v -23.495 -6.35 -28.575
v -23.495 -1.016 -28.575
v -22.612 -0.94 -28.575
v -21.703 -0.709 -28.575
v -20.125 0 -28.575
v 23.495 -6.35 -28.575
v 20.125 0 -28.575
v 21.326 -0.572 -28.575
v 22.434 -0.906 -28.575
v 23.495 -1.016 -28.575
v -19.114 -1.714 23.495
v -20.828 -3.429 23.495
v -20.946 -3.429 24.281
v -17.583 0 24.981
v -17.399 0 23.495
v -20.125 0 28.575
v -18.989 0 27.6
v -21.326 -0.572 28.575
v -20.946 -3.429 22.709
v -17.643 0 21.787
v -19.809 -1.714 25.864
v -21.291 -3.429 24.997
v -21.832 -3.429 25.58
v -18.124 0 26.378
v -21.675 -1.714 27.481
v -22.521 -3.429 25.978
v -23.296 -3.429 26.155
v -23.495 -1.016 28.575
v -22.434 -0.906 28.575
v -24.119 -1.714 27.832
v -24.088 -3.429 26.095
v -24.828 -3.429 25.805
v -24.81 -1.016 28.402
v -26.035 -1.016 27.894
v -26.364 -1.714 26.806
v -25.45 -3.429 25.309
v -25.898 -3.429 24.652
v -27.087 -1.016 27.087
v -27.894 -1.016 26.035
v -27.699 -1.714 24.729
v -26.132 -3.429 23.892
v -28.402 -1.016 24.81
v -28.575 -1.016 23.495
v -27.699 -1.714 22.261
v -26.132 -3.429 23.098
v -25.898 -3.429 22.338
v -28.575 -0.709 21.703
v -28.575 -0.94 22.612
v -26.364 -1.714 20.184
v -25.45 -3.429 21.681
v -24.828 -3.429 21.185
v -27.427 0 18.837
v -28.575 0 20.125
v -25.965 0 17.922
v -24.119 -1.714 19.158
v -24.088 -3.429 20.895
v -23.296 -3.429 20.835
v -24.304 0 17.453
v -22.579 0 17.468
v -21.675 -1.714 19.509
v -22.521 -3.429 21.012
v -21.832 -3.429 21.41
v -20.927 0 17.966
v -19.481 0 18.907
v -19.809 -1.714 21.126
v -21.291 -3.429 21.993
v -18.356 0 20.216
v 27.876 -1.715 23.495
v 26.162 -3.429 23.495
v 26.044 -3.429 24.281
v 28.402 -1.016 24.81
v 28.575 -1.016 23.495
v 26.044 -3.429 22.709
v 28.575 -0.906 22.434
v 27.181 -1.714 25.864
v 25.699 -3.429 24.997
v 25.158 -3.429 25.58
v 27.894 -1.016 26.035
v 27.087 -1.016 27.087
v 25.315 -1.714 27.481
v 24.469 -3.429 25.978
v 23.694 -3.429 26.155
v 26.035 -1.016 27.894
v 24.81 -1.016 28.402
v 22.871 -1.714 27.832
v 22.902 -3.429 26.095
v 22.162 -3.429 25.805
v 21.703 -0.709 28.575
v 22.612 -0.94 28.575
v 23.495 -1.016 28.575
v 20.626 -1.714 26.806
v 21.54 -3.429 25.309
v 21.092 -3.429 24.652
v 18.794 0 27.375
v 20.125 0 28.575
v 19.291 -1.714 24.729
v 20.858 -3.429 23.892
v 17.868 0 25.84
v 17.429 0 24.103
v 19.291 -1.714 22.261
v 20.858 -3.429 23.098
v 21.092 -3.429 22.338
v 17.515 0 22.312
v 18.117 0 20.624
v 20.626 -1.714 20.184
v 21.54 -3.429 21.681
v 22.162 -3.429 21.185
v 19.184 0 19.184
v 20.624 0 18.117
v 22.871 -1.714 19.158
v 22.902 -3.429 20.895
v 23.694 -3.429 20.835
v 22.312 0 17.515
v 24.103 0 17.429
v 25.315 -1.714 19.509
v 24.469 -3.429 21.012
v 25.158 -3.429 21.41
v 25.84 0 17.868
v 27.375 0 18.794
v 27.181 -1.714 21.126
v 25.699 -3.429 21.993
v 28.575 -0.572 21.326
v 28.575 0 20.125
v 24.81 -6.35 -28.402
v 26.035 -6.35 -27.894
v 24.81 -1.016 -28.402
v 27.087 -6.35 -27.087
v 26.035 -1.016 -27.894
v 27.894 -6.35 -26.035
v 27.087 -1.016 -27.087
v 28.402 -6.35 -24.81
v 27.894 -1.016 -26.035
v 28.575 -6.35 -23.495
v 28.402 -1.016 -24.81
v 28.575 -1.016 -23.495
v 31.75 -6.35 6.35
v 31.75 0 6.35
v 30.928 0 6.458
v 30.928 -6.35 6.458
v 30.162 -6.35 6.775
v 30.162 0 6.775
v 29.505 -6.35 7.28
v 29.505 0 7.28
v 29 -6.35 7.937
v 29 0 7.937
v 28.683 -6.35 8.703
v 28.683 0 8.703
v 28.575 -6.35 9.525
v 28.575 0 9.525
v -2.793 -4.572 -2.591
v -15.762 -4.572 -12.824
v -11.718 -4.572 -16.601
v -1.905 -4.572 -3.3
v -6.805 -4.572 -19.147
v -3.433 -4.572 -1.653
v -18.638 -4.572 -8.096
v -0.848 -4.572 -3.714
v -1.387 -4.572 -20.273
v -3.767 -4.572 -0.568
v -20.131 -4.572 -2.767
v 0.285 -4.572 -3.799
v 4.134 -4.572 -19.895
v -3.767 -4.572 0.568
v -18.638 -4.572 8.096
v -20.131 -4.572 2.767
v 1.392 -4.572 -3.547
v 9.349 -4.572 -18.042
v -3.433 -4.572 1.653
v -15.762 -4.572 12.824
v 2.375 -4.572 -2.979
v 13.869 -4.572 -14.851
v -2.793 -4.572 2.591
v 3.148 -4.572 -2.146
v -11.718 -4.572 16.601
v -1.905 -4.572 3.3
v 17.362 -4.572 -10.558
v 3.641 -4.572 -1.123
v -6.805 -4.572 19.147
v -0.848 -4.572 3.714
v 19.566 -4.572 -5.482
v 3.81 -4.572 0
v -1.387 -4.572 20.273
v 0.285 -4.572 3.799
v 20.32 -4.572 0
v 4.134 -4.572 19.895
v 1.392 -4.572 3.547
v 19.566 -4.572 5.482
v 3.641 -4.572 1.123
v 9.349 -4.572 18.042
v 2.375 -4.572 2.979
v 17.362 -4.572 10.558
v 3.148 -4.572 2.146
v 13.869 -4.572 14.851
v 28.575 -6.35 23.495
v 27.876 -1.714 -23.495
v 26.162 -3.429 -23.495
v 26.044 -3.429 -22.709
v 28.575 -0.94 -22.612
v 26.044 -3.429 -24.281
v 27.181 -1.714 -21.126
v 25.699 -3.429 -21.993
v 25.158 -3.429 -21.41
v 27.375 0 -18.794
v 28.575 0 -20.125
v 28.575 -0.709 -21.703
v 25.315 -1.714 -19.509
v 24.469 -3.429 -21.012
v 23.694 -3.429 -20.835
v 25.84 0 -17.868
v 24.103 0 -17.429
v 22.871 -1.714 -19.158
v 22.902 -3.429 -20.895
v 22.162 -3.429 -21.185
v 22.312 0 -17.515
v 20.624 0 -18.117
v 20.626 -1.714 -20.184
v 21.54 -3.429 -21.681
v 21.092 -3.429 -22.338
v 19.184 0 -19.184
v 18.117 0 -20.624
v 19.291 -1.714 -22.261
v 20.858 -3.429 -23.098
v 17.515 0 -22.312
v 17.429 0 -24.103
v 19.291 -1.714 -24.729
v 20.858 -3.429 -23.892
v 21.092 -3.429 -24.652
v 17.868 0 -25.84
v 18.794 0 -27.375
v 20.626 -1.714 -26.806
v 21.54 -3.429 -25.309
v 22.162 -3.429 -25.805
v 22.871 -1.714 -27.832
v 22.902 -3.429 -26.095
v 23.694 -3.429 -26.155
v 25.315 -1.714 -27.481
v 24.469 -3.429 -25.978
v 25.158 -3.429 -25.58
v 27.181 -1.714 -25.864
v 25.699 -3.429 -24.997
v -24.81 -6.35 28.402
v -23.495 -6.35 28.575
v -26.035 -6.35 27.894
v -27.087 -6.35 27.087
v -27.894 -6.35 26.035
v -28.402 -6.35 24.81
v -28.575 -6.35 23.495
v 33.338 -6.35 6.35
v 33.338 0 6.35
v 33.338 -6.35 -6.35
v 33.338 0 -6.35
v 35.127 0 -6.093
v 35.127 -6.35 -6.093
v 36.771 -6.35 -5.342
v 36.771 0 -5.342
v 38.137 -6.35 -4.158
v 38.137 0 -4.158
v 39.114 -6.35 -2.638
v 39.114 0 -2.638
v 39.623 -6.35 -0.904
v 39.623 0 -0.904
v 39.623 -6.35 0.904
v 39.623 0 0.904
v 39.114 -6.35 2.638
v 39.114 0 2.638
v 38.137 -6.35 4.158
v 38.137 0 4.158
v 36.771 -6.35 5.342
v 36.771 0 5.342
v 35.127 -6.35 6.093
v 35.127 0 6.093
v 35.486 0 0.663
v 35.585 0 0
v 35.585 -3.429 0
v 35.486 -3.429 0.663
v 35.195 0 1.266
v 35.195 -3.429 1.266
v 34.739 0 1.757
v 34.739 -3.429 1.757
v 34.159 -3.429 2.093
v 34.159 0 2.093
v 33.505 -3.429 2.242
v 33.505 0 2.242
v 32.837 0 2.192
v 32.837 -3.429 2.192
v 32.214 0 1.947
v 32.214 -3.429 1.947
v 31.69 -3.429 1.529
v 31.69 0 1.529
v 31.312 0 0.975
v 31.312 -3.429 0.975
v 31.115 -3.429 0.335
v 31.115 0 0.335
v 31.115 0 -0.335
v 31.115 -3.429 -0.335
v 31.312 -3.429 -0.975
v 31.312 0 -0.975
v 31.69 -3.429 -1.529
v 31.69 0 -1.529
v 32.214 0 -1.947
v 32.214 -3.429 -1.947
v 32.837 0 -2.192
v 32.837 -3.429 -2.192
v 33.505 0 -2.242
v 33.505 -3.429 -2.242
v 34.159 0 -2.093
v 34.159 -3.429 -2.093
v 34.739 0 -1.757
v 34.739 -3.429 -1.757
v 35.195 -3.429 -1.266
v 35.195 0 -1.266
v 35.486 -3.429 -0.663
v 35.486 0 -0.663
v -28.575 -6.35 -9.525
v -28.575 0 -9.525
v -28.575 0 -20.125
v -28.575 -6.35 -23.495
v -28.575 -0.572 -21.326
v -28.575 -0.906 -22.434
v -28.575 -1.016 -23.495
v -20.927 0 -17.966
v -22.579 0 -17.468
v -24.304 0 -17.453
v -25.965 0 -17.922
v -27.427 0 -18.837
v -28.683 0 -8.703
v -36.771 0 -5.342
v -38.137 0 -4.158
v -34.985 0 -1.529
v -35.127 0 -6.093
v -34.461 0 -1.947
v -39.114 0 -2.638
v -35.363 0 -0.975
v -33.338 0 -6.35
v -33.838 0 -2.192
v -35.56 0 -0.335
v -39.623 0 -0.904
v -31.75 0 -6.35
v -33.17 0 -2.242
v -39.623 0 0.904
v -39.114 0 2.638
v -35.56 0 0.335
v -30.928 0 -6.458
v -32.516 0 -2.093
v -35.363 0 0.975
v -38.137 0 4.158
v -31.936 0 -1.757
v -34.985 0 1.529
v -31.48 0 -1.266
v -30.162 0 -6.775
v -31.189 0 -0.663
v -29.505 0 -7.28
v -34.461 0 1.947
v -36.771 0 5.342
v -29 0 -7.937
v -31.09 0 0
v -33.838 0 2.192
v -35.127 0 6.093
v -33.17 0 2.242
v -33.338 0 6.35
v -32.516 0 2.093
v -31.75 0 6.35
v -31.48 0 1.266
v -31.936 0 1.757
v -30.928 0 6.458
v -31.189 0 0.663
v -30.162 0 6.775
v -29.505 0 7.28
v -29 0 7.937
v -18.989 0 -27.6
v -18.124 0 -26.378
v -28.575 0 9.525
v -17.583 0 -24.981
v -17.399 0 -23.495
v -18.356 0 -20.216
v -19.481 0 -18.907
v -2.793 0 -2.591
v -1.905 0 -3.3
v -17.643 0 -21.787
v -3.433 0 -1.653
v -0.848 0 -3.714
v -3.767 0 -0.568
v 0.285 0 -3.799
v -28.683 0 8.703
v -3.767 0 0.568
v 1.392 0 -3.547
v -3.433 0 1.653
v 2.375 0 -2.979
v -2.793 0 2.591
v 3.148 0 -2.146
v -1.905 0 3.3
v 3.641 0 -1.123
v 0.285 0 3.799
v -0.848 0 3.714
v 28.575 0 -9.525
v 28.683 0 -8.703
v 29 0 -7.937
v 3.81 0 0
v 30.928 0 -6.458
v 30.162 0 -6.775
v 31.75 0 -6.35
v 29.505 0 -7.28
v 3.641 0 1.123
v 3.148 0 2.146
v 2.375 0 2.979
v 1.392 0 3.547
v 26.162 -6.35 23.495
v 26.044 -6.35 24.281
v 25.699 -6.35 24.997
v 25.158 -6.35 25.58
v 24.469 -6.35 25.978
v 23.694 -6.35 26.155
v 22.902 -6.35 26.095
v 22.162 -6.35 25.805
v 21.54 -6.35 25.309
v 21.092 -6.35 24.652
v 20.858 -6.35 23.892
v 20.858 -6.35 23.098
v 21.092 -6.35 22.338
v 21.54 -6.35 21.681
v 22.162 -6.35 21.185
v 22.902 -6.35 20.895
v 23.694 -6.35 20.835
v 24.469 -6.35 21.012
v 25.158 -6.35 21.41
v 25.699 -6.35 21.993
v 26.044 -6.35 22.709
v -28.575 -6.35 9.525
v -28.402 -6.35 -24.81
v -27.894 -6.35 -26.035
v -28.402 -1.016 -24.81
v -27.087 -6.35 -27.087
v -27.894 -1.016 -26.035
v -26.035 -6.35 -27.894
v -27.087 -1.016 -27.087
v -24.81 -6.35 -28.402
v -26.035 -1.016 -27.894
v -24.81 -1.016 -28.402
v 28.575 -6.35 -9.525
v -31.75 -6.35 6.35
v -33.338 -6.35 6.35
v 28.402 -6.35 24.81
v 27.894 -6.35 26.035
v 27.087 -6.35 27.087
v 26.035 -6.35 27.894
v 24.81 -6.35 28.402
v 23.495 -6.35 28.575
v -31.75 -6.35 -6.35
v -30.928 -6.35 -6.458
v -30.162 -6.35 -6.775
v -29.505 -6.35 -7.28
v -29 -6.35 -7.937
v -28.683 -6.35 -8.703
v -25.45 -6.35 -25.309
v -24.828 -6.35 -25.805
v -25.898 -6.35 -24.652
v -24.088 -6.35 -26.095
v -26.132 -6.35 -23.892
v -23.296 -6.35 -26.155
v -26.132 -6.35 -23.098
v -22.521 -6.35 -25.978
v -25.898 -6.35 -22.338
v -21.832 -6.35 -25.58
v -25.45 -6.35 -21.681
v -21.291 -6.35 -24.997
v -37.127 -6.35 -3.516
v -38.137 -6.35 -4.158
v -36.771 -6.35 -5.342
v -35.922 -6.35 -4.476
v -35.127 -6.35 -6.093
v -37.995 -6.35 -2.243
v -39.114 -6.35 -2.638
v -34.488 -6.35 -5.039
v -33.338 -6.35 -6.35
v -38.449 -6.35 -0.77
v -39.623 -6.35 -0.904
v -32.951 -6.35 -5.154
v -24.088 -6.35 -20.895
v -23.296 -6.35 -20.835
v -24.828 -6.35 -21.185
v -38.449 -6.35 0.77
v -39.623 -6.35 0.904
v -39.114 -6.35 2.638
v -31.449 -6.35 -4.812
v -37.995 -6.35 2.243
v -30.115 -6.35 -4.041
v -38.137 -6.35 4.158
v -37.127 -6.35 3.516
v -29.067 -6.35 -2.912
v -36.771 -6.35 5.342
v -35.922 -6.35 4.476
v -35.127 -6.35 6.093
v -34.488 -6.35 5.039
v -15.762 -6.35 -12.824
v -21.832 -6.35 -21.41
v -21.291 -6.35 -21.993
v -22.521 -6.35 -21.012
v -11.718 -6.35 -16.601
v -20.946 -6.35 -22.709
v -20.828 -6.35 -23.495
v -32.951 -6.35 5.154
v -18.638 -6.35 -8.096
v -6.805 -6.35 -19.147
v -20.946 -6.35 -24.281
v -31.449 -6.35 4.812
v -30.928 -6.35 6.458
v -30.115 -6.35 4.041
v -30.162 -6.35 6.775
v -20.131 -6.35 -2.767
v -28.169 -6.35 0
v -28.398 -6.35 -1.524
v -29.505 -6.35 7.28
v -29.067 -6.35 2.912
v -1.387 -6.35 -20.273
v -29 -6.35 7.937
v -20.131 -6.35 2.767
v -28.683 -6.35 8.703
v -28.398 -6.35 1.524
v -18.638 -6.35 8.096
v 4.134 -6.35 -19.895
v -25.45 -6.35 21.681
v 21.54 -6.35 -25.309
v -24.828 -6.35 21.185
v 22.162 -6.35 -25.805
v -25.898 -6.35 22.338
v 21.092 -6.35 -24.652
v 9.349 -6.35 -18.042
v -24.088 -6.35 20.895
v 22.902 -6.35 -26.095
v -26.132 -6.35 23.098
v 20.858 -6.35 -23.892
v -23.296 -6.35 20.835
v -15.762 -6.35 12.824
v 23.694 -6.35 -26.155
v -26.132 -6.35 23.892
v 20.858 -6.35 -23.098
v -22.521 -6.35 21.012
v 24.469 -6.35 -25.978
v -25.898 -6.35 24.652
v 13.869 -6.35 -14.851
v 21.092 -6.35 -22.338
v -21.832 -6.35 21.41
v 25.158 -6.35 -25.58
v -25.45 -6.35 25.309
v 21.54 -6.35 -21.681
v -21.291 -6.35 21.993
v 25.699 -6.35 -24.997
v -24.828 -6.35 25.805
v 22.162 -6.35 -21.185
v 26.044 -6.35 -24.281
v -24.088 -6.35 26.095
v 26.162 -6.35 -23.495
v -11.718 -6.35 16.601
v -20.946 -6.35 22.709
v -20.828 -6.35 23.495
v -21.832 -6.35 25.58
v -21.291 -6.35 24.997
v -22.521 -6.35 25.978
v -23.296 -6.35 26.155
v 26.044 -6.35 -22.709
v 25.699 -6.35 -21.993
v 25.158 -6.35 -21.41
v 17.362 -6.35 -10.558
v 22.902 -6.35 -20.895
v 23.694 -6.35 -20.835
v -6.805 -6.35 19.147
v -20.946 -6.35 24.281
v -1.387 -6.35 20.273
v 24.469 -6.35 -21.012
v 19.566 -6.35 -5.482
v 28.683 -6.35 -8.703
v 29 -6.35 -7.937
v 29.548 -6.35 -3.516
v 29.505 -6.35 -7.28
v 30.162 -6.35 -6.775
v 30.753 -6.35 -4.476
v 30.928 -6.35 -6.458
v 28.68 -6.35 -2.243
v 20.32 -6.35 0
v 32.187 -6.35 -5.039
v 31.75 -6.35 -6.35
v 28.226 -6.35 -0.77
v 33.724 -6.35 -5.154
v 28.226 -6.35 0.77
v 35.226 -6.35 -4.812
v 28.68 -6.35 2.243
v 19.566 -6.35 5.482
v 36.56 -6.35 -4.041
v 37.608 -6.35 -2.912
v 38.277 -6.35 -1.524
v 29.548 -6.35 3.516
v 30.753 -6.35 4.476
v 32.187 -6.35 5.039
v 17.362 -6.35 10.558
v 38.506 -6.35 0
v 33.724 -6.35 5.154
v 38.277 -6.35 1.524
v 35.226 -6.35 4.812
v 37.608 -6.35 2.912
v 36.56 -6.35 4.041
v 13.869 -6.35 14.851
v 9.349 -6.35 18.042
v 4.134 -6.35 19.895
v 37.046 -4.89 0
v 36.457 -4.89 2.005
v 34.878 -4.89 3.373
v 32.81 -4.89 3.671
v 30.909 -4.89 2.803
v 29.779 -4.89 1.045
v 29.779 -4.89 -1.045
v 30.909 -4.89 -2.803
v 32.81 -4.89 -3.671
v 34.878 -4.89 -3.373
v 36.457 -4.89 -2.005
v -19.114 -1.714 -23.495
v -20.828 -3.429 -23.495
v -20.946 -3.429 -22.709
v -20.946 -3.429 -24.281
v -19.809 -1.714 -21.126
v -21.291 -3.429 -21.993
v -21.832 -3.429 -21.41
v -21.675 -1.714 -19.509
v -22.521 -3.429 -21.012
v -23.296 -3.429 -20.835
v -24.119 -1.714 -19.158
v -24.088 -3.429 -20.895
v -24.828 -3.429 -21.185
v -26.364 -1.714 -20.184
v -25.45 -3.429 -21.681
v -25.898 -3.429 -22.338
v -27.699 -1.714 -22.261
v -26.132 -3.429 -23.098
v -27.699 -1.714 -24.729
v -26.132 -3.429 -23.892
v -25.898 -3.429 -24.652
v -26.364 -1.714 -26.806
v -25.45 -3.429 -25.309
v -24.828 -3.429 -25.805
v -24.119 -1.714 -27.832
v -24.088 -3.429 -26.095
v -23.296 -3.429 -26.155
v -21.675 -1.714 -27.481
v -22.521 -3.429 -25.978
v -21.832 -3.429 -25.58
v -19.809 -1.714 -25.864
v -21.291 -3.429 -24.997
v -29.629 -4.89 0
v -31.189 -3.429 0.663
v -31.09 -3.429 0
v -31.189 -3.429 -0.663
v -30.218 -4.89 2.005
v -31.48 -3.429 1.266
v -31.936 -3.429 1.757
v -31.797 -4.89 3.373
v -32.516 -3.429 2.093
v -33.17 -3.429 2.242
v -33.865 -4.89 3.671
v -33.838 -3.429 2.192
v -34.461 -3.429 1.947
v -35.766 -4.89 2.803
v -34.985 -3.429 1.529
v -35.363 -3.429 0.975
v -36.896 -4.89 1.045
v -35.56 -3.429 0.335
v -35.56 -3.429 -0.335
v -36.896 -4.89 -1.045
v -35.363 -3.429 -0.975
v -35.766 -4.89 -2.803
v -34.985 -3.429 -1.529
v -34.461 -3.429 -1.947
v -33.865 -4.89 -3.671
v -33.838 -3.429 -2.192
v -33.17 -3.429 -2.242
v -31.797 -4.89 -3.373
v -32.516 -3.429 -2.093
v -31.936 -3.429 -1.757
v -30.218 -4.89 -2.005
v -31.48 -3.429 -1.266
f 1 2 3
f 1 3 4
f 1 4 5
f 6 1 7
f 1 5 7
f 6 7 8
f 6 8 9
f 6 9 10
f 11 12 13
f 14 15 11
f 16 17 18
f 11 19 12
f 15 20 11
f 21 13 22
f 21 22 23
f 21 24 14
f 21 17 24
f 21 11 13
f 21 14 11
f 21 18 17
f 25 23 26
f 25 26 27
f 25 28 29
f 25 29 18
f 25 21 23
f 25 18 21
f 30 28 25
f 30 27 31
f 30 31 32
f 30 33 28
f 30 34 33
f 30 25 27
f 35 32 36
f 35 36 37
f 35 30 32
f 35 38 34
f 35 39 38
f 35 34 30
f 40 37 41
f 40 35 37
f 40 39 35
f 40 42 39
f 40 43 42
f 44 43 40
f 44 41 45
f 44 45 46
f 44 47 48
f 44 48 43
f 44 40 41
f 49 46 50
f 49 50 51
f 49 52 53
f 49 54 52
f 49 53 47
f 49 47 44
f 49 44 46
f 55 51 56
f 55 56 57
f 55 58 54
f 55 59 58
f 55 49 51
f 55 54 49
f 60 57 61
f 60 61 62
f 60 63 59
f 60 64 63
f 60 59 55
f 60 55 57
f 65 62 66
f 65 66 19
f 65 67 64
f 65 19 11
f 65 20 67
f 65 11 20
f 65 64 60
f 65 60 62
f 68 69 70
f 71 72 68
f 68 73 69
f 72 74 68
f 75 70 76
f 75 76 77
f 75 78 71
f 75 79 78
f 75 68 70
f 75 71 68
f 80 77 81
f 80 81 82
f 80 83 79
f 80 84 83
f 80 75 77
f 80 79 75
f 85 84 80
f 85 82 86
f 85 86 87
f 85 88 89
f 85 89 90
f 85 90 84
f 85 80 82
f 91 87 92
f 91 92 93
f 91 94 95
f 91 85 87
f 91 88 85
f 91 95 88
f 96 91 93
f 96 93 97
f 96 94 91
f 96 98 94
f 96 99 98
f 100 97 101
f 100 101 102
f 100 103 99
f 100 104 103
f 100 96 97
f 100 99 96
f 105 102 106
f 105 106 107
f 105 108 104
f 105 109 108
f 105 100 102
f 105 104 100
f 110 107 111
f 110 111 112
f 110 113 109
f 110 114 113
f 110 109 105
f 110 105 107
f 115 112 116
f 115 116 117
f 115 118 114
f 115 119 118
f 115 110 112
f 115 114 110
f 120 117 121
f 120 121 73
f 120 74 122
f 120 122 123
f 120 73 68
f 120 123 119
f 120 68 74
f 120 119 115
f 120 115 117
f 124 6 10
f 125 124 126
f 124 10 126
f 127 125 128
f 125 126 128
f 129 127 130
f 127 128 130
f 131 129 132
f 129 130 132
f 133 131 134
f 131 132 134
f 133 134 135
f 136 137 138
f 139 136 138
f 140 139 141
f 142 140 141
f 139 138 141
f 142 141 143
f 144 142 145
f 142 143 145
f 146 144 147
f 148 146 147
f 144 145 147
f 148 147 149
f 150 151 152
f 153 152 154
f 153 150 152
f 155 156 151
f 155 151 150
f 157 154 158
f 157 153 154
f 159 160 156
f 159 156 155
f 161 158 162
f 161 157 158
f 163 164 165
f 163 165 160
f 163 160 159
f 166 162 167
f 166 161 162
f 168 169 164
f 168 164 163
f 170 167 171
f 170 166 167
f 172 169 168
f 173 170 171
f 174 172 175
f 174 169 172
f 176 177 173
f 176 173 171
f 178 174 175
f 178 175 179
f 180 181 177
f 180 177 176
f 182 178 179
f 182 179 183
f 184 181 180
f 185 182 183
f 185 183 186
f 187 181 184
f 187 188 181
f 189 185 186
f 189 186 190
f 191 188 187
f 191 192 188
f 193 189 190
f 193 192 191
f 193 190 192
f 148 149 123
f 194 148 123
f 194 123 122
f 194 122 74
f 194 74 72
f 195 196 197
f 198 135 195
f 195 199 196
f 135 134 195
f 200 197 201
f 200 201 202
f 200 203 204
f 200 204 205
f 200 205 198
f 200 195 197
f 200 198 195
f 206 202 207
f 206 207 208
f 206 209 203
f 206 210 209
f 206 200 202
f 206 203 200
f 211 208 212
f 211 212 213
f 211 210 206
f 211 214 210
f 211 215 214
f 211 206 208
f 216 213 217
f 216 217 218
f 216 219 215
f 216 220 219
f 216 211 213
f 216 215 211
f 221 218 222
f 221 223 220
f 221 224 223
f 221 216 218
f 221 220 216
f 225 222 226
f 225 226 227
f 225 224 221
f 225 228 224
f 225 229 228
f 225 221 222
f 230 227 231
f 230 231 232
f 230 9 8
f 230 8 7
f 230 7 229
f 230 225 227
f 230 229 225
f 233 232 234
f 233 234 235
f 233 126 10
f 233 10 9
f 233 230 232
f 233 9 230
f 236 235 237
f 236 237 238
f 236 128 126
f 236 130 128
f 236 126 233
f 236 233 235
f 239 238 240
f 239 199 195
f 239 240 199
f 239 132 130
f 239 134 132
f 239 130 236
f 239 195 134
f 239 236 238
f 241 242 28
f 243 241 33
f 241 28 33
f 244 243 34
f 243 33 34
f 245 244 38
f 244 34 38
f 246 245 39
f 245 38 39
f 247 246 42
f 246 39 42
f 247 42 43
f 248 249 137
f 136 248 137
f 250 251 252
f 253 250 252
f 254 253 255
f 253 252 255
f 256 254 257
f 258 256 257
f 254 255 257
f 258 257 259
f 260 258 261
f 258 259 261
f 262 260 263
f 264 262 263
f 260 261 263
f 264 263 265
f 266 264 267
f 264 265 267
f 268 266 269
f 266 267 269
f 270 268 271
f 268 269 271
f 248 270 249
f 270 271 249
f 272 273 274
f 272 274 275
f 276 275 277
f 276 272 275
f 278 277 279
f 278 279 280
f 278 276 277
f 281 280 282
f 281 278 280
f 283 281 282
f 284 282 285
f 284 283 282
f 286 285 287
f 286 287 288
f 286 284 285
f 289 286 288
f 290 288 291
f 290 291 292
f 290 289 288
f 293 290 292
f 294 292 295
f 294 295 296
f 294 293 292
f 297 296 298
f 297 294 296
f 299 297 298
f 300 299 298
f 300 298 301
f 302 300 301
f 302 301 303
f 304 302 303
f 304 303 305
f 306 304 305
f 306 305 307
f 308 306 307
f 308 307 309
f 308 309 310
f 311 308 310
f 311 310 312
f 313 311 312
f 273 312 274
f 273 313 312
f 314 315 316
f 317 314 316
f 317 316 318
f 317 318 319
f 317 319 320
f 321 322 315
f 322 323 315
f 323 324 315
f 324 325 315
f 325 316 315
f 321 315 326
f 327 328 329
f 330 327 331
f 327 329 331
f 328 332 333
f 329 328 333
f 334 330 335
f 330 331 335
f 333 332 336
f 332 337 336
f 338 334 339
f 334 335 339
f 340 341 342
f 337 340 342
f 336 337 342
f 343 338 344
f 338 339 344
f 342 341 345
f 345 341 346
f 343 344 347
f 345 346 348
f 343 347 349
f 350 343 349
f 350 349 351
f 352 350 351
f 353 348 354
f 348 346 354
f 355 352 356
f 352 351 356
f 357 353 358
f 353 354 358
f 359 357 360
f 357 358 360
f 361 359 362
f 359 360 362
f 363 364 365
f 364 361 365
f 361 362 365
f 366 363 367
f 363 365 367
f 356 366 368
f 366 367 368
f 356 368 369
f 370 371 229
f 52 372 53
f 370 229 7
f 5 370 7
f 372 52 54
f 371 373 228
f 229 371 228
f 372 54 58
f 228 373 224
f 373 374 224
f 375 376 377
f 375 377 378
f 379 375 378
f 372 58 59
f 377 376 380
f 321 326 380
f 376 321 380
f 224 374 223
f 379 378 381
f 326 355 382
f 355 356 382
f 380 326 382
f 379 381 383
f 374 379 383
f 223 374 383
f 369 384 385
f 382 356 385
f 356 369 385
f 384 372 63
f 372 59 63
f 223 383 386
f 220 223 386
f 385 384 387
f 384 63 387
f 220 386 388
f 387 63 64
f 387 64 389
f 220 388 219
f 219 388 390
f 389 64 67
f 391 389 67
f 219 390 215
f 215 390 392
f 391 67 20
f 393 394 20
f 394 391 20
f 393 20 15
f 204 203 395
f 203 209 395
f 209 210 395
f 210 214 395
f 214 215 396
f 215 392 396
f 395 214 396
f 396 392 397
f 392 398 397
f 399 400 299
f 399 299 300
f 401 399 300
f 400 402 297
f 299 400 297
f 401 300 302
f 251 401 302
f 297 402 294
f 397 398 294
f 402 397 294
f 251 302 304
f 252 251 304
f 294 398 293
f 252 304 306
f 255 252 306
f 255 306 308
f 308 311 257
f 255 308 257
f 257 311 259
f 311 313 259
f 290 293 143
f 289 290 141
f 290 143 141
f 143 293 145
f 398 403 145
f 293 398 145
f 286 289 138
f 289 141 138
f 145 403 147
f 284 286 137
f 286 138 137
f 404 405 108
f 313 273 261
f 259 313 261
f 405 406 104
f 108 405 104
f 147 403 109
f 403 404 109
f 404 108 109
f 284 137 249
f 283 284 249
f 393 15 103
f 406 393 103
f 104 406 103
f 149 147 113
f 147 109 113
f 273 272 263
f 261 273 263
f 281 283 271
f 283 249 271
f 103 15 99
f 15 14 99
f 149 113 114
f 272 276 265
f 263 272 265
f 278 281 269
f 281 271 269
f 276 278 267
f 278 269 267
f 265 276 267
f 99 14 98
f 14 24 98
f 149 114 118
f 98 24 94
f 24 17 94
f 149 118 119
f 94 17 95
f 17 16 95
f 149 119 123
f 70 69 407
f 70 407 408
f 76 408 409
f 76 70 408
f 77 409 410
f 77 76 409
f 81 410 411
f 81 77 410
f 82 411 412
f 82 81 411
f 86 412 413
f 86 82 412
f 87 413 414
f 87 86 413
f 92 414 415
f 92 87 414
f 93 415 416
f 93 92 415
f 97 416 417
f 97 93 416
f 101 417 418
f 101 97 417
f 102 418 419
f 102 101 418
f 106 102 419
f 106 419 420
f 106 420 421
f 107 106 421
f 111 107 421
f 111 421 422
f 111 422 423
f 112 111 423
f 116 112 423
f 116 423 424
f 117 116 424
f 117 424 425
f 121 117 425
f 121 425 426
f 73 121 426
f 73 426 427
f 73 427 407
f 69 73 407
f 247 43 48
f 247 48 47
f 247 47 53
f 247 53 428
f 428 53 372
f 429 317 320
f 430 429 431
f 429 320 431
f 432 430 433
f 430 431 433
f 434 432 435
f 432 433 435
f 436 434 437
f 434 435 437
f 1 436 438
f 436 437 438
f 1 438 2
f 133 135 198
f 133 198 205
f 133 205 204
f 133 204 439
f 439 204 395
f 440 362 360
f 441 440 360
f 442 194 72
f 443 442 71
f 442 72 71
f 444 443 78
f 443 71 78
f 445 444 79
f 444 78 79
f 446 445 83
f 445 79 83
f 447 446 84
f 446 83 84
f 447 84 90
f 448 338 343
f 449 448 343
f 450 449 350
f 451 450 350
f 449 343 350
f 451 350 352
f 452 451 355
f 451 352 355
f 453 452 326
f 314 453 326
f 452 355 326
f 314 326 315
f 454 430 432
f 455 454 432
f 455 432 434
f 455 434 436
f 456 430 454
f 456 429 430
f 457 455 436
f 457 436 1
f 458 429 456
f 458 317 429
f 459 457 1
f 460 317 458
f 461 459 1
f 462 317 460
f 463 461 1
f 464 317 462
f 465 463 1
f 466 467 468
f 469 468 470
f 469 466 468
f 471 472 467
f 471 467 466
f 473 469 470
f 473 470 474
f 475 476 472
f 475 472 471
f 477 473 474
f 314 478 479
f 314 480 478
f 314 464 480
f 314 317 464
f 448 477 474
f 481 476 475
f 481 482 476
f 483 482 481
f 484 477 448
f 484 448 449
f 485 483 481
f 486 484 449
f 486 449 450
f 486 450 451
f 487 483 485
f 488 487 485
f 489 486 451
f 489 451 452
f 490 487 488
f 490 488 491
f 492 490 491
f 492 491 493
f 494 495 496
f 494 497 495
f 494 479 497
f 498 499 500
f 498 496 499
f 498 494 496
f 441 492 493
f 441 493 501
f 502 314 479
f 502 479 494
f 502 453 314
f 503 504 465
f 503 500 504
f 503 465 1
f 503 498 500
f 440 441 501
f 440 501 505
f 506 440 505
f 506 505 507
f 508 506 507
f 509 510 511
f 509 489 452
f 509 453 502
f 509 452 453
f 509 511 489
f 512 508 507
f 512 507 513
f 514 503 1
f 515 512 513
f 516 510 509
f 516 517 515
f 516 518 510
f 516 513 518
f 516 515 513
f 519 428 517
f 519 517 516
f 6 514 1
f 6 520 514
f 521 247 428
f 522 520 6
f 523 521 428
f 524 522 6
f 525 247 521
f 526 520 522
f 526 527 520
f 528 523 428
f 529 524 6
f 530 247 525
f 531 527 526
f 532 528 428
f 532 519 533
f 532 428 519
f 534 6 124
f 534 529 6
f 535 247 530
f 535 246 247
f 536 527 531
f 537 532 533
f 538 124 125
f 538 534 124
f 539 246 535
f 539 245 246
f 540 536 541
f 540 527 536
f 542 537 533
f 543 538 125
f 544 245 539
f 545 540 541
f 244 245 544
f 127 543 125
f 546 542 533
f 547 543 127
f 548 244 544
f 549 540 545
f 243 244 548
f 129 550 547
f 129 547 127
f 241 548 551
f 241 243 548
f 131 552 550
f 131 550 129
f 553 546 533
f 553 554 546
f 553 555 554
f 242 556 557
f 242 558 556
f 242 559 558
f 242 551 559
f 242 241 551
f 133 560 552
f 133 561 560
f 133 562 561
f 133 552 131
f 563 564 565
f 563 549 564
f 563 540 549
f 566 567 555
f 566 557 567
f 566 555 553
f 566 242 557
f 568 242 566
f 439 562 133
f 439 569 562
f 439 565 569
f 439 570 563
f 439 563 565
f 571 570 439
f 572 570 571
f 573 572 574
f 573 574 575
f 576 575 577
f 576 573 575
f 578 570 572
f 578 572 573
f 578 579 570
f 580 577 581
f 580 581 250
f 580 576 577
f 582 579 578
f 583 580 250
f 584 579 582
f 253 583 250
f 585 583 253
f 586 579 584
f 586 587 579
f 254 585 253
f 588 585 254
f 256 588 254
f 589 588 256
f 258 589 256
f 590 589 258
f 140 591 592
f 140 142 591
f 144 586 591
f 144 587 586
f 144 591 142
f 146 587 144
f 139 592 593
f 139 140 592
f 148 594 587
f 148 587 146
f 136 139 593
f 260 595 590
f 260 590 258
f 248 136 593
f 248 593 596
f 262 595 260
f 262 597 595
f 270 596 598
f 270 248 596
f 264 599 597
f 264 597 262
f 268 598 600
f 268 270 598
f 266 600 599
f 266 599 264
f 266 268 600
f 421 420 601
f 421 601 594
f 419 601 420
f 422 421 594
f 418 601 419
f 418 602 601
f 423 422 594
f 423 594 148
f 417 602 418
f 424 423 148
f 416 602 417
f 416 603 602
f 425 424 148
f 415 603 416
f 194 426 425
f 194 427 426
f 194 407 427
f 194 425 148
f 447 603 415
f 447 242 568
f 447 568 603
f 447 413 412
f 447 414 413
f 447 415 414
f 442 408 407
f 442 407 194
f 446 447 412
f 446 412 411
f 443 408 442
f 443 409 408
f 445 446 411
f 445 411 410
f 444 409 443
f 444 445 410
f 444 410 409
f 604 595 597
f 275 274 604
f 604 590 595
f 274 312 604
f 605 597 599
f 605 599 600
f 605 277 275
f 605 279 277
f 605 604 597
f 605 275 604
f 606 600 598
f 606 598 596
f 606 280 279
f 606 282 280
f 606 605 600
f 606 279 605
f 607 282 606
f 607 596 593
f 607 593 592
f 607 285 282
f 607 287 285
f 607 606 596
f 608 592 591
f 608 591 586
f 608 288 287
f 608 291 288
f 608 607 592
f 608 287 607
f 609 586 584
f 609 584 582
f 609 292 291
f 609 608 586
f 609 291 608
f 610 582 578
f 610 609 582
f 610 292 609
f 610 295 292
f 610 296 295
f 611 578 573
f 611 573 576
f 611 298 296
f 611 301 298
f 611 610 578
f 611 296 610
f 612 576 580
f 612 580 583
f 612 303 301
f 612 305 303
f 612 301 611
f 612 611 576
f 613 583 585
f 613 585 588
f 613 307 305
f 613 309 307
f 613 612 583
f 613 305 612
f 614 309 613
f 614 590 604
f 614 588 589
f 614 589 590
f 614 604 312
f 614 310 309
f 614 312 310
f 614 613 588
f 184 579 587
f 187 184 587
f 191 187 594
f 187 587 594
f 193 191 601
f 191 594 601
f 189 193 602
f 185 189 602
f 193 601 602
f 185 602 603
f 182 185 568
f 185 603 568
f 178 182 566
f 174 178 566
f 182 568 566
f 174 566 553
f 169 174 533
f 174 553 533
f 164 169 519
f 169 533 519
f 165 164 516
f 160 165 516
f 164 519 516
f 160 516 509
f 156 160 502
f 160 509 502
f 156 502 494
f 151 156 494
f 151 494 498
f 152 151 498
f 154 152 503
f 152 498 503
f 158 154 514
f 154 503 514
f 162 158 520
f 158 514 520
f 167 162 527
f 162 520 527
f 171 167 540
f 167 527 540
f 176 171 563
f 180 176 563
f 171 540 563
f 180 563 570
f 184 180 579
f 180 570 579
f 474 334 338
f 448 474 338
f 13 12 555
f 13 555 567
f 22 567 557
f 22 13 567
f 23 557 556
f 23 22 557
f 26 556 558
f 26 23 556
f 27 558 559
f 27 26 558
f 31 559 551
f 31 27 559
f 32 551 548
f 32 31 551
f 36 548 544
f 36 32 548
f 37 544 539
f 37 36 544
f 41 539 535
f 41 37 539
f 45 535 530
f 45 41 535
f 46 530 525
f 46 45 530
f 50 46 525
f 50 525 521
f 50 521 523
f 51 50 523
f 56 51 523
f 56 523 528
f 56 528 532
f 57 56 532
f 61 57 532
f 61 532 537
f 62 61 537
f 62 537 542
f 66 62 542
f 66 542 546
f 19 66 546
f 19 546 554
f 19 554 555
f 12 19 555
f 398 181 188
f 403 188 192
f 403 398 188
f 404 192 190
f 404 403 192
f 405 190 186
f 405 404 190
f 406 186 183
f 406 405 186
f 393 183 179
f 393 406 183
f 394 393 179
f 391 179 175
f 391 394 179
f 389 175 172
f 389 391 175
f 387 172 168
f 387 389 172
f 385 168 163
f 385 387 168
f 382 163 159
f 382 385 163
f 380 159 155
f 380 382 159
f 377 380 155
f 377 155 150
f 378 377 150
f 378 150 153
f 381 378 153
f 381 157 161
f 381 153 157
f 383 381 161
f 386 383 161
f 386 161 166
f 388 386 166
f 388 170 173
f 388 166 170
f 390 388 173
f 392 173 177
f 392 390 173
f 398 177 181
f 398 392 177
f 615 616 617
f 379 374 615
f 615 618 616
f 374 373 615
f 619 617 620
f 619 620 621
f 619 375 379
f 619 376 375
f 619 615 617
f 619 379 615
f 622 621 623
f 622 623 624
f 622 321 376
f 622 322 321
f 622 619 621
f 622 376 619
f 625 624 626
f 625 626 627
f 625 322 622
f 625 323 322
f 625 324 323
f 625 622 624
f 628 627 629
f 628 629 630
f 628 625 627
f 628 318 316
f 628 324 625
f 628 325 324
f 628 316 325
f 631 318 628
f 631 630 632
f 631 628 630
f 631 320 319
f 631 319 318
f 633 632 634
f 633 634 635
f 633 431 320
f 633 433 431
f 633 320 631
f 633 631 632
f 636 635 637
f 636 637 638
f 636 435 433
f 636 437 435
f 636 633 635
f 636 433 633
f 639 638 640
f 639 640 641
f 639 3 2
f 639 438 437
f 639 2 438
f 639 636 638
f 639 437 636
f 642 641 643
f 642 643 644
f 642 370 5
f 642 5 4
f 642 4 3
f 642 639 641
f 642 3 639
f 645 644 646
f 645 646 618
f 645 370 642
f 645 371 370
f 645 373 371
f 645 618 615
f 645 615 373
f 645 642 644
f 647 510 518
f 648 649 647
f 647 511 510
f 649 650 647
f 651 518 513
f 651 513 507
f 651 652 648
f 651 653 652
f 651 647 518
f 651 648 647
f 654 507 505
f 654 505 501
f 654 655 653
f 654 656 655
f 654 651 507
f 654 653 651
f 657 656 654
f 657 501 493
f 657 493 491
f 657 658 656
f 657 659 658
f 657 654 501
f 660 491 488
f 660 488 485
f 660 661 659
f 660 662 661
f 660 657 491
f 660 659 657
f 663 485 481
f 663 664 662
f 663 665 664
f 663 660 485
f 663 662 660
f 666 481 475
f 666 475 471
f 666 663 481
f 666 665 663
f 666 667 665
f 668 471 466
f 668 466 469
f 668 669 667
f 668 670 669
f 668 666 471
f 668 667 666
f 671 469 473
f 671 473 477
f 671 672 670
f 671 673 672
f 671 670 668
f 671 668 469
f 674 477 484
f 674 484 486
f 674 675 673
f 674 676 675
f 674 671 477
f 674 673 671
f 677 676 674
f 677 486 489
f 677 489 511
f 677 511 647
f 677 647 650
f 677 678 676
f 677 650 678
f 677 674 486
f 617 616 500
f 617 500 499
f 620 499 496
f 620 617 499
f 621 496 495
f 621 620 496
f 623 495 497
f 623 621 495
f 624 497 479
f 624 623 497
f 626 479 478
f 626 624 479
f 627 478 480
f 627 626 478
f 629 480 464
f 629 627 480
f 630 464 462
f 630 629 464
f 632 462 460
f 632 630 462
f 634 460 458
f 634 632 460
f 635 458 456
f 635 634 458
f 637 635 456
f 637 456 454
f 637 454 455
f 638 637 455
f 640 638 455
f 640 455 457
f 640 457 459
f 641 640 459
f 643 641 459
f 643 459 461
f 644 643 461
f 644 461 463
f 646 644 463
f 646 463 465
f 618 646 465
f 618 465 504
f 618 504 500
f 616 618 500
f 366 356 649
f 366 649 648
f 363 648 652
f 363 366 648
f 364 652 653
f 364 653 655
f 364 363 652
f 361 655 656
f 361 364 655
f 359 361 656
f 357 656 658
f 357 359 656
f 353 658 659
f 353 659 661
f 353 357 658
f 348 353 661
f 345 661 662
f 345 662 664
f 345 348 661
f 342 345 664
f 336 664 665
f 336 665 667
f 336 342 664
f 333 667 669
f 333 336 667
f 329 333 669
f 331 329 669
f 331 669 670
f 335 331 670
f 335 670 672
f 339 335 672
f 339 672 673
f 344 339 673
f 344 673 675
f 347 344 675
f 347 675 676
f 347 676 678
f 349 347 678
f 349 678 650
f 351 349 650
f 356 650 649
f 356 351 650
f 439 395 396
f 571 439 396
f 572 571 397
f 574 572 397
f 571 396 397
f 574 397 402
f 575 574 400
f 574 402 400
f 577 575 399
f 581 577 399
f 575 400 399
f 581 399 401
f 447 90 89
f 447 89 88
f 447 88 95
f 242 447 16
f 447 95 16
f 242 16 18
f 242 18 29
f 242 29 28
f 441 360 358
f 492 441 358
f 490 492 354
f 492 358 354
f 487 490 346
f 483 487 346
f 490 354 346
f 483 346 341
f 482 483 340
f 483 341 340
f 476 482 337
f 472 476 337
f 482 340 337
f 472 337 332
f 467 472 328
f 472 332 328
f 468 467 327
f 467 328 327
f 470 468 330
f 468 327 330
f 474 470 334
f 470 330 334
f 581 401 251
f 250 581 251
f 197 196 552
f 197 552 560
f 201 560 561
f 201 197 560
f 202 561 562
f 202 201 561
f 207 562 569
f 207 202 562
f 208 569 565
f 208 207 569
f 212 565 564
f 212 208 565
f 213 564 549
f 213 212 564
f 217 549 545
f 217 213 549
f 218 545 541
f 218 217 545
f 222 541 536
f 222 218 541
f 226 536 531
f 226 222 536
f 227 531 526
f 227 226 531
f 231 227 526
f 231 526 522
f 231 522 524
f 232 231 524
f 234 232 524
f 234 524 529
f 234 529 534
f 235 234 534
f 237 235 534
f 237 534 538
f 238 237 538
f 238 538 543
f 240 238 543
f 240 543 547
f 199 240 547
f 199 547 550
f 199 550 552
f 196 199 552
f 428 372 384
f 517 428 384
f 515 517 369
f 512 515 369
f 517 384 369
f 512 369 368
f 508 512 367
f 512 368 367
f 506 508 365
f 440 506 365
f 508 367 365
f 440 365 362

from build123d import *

# Parameters (mm, degrees)
F0_R     = 2.667
F0_R_2   = 2.2479
F0_R_3   = 3.81
F1_DEPTH = 6.35
F2_R     = 20.32
F2_R_2   = 3.81
F3_DEPTH = 1.778
F4_SIZE  = 2.921


# Not quite as in the source:
# - a fillet or chamfer that OpenCascade refuses, or shapes differently, is made with other operations: its cross-section is extruded or revolved along the edge and cut away or added


with BuildPart() as f1:
    # F0 (on Front) → F1 (new body)
    with BuildSketch(Plane.XZ):
        with BuildLine():
            Line((-23.495, -28.575), (23.495, -28.575))
            ThreePointArc((23.495, -28.575), (27.0871024484, -27.0871024484), (28.575, -23.495))
            Line((28.575, -23.495), (28.575, -9.525))
            ThreePointArc((28.575, -9.525), (29.5049359697, -7.2799359697), (31.75, -6.35))
            Line((31.75, -6.35), (33.3375, -6.35))
            ThreePointArc((33.3375, -6.35), (39.6875, 0), (33.3375, 6.35))
            Line((33.3375, 6.35), (31.75, 6.35))
            ThreePointArc((31.75, 6.35), (29.5049359697, 7.2799359697), (28.575, 9.525))
            Line((28.575, 9.525), (28.575, 23.495))
            ThreePointArc((28.575, 23.495), (27.0871024484, 27.0871024484), (23.495, 28.575))
            Line((23.495, 28.575), (-23.495, 28.575))
            ThreePointArc((-23.495, 28.575), (-27.0871024484, 27.0871024484), (-28.575, 23.495))
            Line((-28.575, 23.495), (-28.575, 9.525))
            ThreePointArc((-28.575, 9.525), (-29.5049359697, 7.2799359697), (-31.75, 6.35))
            Line((-31.75, 6.35), (-33.3375, 6.35))
            ThreePointArc((-33.3375, 6.35), (-39.6875, 0), (-33.3375, -6.35))
            Line((-33.3375, -6.35), (-31.75, -6.35))
            ThreePointArc((-31.75, -6.35), (-29.5049359697, -7.2799359697), (-28.575, -9.525))
            Line((-28.575, -9.525), (-28.575, -23.495))
            ThreePointArc((-28.575, -23.495), (-27.0871024484, -27.0871024484), (-23.495, -28.575))
        make_face()
        with Locations((-23.495, -23.495)):
            Circle(F0_R, mode=Mode.SUBTRACT)
        with Locations((23.495, -23.495)):
            Circle(F0_R, mode=Mode.SUBTRACT)
        with Locations((-33.3375, 0)):
            Circle(F0_R_2, mode=Mode.SUBTRACT)
        with Locations((-23.495, 23.495)):
            Circle(F0_R, mode=Mode.SUBTRACT)
        Circle(F0_R_3, mode=Mode.SUBTRACT)
        with Locations((33.3375, 0)):
            Circle(F0_R_2, mode=Mode.SUBTRACT)
        with Locations((23.495, 23.495)):
            Circle(F0_R, mode=Mode.SUBTRACT)
    extrude(amount=F1_DEPTH)

    # F2 (on face) → F3 (cut)
    with BuildSketch(Plane.XZ.offset(6.35)):
        Circle(F2_R)
        Circle(F2_R_2, mode=Mode.SUBTRACT)
        Circle(F2_R)
    extrude(amount=-F3_DEPTH, mode=Mode.SUBTRACT)

    # F4
    f4_edges = [f1.edges().sort_by_distance(p)[0] for p in [
        (-35.5854, -6.35, 0),
        (31.0896, -6.35, 0),
    ]]
    chamfer(f4_edges, length=F4_SIZE)

    # F5: chamfer of 3.429 on 4 edges, made by hand

    # F5_s1 → F5_t2 (revolve, cut)
    with BuildSketch(Plane.XY.offset(23.495)):
        Polygon((26.162, -3.429), (29.591, 0), (26.162, 0), align=None)
    revolve(axis=Axis((23.495, 0, 23.495), (0, -1, 0)), mode=Mode.SUBTRACT)

    # F5_s3 → F5_t4 (revolve, cut)
    with BuildSketch(Plane.XY.offset(23.495)):
        Polygon((-20.828, -3.429), (-17.399, 0), (-20.828, 0), align=None)
    revolve(axis=Axis((-23.495, 0, 23.495), (0, -1, 0)), mode=Mode.SUBTRACT)

    # F5_s5 → F5_t6 (revolve, cut)
    with BuildSketch(Plane.XY.offset(-23.495)):
        Polygon((26.162, -3.429), (29.591, 0), (26.162, 0), align=None)
    revolve(axis=Axis((23.495, 0, -23.495), (0, -1, 0)), mode=Mode.SUBTRACT)

    # F5_s7 → F5_t8 (revolve, cut)
    with BuildSketch(Plane.XY.offset(-23.495)):
        Polygon((-20.828, -3.429), (-17.399, 0), (-20.828, 0), align=None)
    revolve(axis=Axis((-23.495, 0, -23.495), (0, -1, 0)), mode=Mode.SUBTRACT)


solid = f1.part
